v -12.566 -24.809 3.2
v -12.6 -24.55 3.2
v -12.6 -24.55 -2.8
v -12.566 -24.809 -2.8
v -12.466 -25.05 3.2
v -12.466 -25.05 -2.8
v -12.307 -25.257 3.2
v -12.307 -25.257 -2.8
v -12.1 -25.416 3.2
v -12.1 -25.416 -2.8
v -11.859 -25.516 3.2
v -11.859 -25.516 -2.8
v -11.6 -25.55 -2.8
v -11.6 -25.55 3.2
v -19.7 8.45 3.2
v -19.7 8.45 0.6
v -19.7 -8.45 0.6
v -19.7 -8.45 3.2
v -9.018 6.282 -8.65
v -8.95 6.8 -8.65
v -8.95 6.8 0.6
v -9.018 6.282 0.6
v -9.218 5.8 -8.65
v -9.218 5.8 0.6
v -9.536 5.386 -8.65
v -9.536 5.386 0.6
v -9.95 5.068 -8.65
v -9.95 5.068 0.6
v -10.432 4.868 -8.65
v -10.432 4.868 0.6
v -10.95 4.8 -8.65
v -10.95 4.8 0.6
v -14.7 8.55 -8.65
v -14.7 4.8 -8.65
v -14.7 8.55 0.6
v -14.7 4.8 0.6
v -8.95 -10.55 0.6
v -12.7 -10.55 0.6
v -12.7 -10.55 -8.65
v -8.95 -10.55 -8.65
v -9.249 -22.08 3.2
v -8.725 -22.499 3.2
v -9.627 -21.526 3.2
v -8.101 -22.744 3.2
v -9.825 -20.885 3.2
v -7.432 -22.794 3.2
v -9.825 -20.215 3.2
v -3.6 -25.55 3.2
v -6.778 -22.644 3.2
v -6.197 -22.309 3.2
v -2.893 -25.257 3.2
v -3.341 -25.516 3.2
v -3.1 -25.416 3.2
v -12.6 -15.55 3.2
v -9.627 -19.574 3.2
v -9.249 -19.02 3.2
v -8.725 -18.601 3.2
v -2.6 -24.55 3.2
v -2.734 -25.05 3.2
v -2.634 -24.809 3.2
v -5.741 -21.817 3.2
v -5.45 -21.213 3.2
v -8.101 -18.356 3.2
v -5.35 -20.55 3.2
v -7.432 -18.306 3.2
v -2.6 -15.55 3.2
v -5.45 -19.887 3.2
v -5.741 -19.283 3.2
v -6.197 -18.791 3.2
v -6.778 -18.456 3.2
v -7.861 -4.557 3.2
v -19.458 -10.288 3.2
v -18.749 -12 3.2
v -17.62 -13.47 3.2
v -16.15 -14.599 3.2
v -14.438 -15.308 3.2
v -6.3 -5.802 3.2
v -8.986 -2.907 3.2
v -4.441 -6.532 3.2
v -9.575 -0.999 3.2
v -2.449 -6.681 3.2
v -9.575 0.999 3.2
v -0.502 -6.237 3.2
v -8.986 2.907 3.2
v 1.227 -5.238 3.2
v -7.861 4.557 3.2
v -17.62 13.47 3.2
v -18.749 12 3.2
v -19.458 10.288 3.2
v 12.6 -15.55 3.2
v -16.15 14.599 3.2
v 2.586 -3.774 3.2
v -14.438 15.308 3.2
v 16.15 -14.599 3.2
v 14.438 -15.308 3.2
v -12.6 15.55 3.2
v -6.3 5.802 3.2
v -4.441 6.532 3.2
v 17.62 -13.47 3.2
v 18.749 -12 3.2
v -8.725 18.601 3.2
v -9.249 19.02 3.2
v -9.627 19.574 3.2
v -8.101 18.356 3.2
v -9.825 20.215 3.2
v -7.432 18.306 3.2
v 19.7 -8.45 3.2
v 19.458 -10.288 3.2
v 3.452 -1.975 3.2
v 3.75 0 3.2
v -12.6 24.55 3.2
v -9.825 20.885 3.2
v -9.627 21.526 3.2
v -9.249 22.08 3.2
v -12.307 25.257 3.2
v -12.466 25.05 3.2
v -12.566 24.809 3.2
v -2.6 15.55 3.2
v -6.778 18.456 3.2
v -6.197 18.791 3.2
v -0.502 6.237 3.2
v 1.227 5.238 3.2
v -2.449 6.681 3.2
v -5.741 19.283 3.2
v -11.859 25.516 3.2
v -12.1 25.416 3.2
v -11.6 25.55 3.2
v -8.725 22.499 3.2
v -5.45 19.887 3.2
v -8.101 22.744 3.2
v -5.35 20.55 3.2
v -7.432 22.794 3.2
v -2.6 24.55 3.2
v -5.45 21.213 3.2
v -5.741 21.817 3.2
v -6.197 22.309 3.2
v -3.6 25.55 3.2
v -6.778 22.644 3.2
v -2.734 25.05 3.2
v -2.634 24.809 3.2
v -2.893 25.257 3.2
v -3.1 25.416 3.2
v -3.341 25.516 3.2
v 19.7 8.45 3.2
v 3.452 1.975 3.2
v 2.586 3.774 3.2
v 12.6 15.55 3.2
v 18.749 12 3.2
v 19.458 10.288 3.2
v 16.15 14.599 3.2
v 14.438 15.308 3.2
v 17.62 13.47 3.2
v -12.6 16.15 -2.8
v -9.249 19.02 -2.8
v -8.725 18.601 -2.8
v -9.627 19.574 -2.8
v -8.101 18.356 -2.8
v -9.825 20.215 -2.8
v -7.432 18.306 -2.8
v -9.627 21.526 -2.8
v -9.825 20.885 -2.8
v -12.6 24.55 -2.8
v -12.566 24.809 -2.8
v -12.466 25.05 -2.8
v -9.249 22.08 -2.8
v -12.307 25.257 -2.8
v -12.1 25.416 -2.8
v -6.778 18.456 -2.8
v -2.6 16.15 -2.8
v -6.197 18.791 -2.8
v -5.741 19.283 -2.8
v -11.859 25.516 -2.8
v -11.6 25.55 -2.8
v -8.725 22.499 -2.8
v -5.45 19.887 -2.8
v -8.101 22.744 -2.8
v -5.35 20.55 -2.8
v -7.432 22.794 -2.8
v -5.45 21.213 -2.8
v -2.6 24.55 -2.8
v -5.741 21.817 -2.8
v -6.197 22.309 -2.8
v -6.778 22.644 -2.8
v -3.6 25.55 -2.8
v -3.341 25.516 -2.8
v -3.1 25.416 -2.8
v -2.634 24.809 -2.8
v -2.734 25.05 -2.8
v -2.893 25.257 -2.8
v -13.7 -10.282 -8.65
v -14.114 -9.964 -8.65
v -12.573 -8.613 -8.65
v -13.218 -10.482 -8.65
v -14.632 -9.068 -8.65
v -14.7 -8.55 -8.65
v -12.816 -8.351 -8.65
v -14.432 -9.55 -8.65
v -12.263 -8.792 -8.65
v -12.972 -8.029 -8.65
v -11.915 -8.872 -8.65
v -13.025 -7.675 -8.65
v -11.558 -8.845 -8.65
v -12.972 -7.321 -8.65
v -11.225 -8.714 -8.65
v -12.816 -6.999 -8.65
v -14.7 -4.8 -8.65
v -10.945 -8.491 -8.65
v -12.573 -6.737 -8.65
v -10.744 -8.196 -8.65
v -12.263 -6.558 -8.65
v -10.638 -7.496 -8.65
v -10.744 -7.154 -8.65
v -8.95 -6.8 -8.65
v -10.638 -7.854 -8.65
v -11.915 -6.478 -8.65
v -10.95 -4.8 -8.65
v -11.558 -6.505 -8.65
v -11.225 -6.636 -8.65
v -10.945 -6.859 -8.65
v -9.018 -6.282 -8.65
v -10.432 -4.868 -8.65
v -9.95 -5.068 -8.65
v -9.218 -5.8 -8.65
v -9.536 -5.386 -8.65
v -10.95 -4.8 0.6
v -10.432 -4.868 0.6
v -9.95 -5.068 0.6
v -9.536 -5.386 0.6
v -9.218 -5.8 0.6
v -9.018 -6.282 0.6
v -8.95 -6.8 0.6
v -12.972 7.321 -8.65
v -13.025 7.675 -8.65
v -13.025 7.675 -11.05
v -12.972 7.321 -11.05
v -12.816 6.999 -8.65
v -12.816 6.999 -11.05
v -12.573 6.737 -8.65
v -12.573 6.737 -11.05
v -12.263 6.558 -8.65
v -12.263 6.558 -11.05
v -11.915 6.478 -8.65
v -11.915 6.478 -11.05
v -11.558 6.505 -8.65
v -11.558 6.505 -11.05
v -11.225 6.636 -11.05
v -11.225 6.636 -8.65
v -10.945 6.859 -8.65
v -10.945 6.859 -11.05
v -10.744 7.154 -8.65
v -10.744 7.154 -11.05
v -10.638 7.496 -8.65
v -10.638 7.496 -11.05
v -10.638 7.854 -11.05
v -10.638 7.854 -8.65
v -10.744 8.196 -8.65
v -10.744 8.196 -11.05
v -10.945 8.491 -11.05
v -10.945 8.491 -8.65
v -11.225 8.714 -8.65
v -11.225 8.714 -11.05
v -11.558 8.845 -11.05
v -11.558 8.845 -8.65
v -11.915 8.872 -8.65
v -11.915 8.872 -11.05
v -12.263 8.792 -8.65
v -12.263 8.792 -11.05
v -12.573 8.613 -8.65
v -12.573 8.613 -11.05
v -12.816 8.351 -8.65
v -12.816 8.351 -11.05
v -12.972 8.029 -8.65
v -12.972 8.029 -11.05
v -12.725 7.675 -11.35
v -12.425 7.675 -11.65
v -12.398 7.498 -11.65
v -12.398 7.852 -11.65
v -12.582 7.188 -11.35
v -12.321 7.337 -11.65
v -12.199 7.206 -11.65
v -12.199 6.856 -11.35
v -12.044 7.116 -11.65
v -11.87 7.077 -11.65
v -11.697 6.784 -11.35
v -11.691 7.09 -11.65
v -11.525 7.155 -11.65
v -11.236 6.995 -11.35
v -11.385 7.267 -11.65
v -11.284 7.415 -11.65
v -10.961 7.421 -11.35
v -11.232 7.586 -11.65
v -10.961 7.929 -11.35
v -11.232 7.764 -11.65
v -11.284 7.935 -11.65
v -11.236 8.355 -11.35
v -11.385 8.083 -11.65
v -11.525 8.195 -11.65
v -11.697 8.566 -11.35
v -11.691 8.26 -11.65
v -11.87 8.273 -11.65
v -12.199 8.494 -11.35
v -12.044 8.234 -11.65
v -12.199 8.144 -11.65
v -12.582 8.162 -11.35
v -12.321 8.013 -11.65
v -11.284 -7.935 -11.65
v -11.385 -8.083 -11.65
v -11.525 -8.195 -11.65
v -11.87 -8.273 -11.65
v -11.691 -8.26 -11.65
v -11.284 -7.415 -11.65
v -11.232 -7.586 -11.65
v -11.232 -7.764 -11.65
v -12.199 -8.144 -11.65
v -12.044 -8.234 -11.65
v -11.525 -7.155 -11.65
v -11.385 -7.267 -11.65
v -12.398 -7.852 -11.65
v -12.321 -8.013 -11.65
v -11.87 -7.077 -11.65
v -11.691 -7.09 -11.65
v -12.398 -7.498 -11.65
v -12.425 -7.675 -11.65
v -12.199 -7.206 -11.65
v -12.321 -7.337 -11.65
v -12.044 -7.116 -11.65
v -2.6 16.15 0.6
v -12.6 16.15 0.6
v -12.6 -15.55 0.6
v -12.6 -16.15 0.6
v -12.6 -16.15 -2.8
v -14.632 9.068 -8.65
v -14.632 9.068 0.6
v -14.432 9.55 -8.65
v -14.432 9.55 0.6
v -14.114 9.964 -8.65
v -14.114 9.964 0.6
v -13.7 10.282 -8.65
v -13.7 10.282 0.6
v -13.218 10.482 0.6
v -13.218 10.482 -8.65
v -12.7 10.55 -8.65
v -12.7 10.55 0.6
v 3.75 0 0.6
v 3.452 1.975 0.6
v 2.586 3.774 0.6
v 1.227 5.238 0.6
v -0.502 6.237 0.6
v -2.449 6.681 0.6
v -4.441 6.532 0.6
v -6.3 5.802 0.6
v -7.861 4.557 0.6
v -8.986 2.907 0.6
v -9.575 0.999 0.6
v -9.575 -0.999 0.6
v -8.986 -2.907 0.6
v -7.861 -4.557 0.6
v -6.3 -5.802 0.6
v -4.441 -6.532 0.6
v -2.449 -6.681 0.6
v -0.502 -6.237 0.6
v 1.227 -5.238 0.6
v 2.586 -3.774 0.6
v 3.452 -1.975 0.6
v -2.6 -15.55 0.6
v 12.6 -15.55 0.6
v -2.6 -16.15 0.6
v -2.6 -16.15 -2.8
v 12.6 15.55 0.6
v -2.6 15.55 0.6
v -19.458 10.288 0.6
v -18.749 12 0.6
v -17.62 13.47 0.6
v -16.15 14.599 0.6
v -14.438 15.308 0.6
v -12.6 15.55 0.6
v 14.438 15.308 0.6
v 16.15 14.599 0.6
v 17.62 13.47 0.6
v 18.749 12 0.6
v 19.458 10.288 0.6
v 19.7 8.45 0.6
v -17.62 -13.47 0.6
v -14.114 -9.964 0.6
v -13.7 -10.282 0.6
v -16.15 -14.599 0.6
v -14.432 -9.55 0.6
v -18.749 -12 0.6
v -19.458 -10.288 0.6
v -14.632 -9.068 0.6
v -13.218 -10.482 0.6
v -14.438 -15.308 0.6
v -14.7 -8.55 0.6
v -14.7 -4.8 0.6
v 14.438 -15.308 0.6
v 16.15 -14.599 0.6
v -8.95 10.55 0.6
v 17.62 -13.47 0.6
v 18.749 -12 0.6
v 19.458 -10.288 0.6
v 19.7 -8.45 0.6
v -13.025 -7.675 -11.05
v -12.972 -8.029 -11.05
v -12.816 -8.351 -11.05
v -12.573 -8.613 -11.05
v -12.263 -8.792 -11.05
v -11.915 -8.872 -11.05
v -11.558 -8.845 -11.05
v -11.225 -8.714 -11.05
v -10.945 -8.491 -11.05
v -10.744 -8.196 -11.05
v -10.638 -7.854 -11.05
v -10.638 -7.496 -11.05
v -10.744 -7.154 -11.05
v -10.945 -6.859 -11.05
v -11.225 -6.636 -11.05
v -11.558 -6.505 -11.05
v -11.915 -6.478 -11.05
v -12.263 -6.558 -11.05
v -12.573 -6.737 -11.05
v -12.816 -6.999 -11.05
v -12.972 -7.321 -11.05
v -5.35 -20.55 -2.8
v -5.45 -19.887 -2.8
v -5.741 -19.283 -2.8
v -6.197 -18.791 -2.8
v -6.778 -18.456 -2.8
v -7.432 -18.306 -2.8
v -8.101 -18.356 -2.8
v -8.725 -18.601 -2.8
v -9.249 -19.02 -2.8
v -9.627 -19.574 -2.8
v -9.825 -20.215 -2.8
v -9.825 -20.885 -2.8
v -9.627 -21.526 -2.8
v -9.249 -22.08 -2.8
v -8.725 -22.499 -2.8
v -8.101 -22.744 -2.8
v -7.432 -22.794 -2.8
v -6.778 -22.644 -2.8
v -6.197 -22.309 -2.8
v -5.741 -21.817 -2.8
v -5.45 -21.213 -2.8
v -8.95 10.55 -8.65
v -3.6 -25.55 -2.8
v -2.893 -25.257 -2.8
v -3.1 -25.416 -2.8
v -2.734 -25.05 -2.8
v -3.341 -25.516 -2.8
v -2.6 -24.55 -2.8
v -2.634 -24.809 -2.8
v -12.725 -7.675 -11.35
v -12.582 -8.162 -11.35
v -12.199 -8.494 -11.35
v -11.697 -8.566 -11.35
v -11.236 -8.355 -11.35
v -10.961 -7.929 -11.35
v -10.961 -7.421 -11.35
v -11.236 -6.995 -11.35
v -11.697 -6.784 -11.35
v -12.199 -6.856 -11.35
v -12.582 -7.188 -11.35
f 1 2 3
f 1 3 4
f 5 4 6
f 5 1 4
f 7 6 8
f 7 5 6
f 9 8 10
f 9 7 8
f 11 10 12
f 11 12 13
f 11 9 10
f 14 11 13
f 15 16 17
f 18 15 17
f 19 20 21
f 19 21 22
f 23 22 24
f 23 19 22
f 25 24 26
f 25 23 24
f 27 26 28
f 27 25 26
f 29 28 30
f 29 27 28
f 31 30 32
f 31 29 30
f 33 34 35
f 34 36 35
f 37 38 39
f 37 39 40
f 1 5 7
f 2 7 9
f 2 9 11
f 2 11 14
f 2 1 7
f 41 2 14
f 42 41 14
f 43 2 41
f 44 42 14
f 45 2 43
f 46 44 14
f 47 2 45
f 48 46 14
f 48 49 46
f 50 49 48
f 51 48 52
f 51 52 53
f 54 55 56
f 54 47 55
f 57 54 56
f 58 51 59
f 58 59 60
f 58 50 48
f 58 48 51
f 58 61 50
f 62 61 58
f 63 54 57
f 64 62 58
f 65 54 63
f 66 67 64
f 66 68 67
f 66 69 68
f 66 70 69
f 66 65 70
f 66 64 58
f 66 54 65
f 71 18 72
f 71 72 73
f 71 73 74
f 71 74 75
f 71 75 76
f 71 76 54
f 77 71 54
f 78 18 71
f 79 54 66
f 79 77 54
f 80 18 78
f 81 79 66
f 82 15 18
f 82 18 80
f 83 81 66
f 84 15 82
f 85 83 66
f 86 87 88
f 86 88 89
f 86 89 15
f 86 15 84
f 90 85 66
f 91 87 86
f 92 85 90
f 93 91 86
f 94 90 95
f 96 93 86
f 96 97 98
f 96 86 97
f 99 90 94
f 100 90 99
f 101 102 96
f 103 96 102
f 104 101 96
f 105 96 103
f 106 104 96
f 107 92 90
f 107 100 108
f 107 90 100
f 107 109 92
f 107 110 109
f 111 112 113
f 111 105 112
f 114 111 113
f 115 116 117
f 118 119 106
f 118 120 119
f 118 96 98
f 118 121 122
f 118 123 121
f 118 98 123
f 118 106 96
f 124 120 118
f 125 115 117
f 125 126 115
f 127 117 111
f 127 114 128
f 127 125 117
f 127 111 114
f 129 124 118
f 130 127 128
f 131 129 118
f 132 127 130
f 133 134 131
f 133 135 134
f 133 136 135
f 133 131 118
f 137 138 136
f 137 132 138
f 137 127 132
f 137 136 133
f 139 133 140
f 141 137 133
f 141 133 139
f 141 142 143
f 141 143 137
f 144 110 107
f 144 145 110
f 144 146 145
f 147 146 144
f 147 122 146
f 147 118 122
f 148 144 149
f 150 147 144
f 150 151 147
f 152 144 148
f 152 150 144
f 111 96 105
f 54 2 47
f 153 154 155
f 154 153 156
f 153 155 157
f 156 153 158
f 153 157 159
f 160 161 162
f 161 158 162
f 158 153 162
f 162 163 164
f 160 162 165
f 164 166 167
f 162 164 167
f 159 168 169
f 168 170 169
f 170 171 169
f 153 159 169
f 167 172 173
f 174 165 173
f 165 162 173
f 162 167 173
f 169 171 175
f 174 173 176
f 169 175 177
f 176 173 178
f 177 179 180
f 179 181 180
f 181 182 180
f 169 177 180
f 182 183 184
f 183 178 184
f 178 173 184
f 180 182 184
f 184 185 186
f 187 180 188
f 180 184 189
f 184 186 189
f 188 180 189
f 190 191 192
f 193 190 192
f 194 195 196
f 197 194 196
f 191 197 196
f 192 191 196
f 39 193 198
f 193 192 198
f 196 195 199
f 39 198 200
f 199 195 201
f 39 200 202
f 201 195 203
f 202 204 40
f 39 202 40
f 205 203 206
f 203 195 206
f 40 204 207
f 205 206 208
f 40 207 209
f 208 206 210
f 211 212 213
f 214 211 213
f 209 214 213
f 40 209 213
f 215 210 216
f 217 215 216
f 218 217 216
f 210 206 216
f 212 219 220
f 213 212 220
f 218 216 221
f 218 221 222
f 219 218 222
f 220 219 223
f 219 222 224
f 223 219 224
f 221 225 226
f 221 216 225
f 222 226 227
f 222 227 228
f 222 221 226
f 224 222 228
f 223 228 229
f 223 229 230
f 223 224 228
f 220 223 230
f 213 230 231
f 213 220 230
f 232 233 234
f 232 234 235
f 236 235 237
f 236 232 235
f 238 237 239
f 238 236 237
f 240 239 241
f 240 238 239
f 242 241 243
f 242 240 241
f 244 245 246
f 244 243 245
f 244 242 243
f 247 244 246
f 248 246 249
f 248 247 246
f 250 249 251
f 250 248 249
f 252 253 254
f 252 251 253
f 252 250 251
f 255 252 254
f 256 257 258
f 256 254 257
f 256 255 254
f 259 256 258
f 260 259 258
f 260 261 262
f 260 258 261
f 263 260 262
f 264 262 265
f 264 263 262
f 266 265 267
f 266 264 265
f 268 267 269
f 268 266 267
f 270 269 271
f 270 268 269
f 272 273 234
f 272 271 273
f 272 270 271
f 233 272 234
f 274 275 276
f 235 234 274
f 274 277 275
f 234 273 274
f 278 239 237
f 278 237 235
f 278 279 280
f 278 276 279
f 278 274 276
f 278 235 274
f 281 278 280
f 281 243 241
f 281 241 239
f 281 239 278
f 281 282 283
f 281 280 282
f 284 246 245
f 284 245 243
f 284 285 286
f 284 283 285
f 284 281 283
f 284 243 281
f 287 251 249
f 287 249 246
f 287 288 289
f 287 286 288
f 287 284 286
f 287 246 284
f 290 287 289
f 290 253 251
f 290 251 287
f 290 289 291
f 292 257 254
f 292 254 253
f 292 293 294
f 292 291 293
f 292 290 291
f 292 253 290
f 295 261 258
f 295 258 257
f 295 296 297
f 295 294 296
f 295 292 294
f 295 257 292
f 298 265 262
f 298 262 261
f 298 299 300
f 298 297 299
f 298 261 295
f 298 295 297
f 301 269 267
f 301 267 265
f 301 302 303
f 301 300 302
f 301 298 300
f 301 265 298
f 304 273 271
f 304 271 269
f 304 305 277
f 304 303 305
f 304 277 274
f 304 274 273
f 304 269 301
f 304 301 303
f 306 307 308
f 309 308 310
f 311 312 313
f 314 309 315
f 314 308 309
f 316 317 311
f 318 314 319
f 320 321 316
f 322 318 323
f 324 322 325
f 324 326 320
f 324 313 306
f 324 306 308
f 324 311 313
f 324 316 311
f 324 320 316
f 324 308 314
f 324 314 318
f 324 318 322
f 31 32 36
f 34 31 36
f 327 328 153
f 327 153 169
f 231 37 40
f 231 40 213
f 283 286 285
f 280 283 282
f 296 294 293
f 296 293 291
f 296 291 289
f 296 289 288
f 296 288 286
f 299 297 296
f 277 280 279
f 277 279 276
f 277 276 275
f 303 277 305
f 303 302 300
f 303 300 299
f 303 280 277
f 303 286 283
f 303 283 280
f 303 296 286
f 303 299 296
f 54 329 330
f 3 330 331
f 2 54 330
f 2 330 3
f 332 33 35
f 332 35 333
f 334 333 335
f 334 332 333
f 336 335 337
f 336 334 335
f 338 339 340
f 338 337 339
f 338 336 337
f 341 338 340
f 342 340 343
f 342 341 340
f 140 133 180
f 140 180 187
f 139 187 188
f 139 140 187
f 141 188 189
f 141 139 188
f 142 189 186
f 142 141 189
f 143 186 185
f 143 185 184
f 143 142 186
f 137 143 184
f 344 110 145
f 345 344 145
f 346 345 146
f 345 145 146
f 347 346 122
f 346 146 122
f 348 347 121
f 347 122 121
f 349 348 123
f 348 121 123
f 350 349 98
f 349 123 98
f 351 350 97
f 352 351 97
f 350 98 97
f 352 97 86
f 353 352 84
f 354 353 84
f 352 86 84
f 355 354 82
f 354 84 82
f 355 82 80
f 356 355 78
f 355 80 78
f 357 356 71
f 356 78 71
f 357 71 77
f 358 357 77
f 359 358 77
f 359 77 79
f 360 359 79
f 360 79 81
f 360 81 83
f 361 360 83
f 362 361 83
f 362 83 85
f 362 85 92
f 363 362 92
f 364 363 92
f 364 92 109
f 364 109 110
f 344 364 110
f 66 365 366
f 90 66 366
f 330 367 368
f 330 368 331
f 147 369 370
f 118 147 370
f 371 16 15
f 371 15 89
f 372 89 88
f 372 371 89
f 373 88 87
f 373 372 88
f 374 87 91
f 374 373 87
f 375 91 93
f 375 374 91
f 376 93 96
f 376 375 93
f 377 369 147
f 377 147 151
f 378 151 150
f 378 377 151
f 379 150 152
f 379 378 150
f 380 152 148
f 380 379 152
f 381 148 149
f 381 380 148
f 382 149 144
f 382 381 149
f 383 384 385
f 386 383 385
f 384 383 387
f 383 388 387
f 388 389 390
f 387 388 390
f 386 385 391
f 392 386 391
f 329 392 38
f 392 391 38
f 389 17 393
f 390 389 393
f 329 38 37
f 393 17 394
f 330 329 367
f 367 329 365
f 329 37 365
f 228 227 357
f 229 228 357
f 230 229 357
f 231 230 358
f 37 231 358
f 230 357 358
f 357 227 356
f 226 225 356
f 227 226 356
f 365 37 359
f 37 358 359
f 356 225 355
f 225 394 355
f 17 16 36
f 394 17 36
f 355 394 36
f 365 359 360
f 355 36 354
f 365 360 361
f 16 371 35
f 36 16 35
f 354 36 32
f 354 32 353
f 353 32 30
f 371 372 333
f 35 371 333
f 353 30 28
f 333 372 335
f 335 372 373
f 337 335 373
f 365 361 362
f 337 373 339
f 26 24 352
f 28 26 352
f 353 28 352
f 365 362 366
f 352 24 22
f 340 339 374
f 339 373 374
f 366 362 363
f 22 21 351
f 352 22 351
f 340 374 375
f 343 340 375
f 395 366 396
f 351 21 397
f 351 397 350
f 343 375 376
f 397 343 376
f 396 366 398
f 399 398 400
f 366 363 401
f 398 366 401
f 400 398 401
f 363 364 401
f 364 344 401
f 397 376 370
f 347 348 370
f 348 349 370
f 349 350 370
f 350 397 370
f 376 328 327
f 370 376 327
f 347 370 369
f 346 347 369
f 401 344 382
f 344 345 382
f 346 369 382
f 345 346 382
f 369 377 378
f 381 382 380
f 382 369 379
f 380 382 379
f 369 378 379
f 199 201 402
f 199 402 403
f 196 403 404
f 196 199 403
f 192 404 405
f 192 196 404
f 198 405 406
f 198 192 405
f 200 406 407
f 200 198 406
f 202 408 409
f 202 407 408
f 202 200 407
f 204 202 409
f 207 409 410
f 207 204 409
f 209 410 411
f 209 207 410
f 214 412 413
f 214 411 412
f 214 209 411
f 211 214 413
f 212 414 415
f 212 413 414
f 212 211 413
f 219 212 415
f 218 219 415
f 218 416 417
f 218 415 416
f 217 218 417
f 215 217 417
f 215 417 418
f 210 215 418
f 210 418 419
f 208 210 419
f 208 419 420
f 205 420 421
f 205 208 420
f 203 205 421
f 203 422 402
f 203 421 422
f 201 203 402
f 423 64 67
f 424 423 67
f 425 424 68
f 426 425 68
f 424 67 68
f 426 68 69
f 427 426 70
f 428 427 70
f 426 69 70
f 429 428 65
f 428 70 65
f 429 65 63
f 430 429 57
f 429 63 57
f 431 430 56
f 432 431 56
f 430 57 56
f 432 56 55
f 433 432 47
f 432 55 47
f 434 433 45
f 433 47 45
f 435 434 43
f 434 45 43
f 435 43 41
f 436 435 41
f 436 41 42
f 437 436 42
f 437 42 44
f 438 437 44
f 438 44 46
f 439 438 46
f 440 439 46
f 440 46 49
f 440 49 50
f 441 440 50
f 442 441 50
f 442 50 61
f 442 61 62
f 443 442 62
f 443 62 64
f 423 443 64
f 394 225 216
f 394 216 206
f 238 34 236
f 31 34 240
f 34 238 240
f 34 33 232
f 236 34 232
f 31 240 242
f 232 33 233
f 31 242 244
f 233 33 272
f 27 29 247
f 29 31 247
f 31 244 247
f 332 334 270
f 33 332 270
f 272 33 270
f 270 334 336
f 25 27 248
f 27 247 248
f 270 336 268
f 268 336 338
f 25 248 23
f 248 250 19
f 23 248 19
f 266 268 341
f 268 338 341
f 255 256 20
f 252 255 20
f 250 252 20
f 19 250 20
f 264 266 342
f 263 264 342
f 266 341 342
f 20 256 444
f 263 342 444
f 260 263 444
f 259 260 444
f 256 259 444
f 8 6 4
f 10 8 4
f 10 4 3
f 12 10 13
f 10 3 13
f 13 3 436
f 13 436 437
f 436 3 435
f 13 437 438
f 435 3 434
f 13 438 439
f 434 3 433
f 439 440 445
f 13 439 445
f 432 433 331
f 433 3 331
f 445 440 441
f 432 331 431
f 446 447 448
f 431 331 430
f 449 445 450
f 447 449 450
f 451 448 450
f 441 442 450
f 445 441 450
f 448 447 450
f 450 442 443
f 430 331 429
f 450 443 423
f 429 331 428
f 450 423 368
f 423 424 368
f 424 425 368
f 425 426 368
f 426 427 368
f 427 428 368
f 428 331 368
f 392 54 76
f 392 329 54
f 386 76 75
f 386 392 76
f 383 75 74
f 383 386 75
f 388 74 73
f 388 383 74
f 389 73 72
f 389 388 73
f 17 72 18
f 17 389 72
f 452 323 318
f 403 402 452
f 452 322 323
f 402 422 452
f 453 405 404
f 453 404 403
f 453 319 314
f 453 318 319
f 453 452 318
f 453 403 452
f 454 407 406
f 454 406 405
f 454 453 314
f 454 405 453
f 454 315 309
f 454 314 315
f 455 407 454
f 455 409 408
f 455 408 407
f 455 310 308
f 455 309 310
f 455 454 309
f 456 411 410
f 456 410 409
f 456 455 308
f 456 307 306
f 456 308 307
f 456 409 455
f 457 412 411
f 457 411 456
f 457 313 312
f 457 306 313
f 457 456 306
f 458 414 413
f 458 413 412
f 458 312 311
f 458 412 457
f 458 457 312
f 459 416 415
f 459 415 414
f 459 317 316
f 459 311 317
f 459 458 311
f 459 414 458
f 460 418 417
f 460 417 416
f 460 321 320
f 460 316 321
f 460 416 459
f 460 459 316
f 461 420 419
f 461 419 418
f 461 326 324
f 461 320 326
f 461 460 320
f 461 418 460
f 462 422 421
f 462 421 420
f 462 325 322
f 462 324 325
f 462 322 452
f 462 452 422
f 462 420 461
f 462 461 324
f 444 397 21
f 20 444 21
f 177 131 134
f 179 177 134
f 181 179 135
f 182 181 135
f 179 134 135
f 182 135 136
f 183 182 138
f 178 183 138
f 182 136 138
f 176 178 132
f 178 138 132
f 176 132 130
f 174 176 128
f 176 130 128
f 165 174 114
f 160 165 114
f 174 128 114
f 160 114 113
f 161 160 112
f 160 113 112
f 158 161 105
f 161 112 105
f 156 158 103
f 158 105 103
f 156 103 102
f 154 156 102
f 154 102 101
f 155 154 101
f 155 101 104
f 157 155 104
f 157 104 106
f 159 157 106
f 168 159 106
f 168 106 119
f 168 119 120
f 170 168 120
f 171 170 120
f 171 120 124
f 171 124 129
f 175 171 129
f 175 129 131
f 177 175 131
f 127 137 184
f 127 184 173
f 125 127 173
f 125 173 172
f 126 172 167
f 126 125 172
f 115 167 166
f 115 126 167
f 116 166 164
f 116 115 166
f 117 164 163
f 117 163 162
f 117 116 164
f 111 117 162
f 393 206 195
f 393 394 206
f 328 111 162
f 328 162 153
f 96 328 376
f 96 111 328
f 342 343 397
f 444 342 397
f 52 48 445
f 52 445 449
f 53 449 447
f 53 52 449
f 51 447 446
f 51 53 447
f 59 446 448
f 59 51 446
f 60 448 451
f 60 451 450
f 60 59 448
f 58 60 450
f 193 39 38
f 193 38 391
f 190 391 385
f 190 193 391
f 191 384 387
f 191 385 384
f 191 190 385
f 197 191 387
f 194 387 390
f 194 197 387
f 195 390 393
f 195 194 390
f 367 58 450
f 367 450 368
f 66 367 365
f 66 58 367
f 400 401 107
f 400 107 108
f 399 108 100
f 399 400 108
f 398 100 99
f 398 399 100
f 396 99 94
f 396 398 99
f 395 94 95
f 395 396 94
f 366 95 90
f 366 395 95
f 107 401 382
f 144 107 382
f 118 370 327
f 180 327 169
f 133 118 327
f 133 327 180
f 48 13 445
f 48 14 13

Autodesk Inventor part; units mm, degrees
ref_plane "YZ Plane" through (0, 0, 0) normal (1, 0, 0) x (0, 1, 0)
ref_plane "Work Plane1" through (0, 0, 0.6) normal (0, 0, 1) x (1, 0, 0)
sketch "Sketch1" plane through (0, 0, 0.6) normal (0, 0, 1) x (1, 0, 0)
  circle A0 centre (-11.825, -7.675) radius 1.2 projected
  circle A1 centre (-11.825, 7.675) radius 1.2 projected
  line L0 (-14.7, 10.55) -> (-8.95, 10.55)
  line L1 (-8.95, 10.55) -> (-8.95, 4.8)
  line L2 (-8.95, 4.8) -> (-14.7, 4.8)
  line L3 (-14.7, 4.8) -> (-14.7, 10.55)
  line L4 (-14.7, 10.55) -> (-8.95, 4.8) construction
  line L5 (-8.95, 10.55) -> (-14.7, 4.8) construction
  line L6 (-14.7, -10.55) -> (-8.95, -10.55)
  line L7 (-8.95, -10.55) -> (-8.95, -4.8)
  line L8 (-8.95, -4.8) -> (-14.7, -4.8)
  line L9 (-14.7, -4.8) -> (-14.7, -10.55)
  line L10 (-14.7, -10.55) -> (-8.95, -4.8) construction
  line L11 (-8.95, -10.55) -> (-14.7, -4.8) construction
  arc A2 (-19.7, -8.45) -> (-12.6, -15.55) centre (-12.6, -8.45) ccw projected
  line L12 (-12.6, -15.55) -> (12.6, -15.55) projected
  arc A3 (12.6, -15.55) -> (19.7, -8.45) centre (12.6, -8.45) ccw projected
  line L13 (19.7, -8.45) -> (19.7, -7) projected
  line L14 (19.7, -7) -> (15.7, -7) projected
  line L15 (15.7, -7) -> (15.7, -8.45) projected
  arc A4 (12.6, -11.55) -> (15.7, -8.45) centre (12.6, -8.45) ccw projected
  line L16 (12.6, -11.55) -> (-12.6, -11.55) projected
  arc A5 (-15.7, -8.45) -> (-12.6, -11.55) centre (-12.6, -8.45) ccw projected
  line L17 (-15.7, -8.45) -> (-15.7, 8.45) projected
  arc A6 (-12.6, 11.55) -> (-15.7, 8.45) centre (-12.6, 8.45) ccw projected
  line L18 (-12.6, 11.55) -> (12.6, 11.55) projected
  arc A7 (15.7, 8.45) -> (12.6, 11.55) centre (12.6, 8.45) ccw projected
  line L19 (15.7, 8.45) -> (15.7, 7) projected
  line L20 (15.7, 7) -> (19.7, 7) projected
  line L21 (19.7, 7) -> (19.7, 8.45) projected
  arc A8 (19.7, 8.45) -> (12.6, 15.55) centre (12.6, 8.45) ccw projected
  line L22 (12.6, 15.55) -> (-12.6, 15.55) projected
  arc A9 (-12.6, 15.55) -> (-19.7, 8.45) centre (-12.6, 8.45) ccw projected
  line L23 (-19.7, 8.45) -> (-19.7, -8.45) projected
  point P0 (0, 0)
  dimension "d1" = 1
  dimension "d2" = 1
ref_plane "Work Plane2" through (-15.1, -10.95, -8.65) normal (0, 0, 1) x (1, 0, 0)
extrude "Extrusion1" add sketch "Sketch1" against normal up to surface (9.25 mm away) contours A0 | A1 | L0 L1 L2 L3 | L9 L8 L7 L6
fillet "Fillet1" radius 2 4 edges at (-14.7, 10.55, -4.025) (-14.7, -10.55, -4.025) (-8.95, 4.8, -4.025) (-8.95, -4.8, -4.025)
sketch "Sketch2" plane through (-10.95, 4.8, -8.65) normal (0, 0, -1) x (-1, 0, 0)
  circle A0 centre (0.875, 2.875) radius 1.2 projected
  circle A1 centre (0.875, -12.475) radius 1.2 projected
  point P0 (-10.95, -4.8)
extrude "Extrusion2" add sketch "Sketch2" along normal blind 3
chamfer "Chamfer1" distance 0.6 angle 45 2 edges at (-10.625, 7.675, -11.65) (-10.625, -7.675, -11.65)
sketch "Sketch3" plane through (0, 0, 0.6) normal (0, 0, 1) x (1, 0, 0)
  arc A0 (-19.7, -8.45) -> (-12.6, -15.55) centre (-12.6, -8.45) ccw projected
  line L0 (-12.6, -15.55) -> (12.6, -15.55) projected
  arc A1 (12.6, -15.55) -> (19.7, -8.45) centre (12.6, -8.45) ccw projected
  line L1 (19.7, -8.45) -> (19.7, -7) projected
  line L2 (19.7, -7) -> (15.7, -7) projected
  line L3 (15.7, -7) -> (15.7, -8.45) projected
  arc A2 (12.6, -11.55) -> (15.7, -8.45) centre (12.6, -8.45) ccw projected
  line L4 (12.6, -11.55) -> (-12.6, -11.55) projected
  arc A3 (-15.7, -8.45) -> (-12.6, -11.55) centre (-12.6, -8.45) ccw projected
  line L5 (-15.7, -8.45) -> (-15.7, 8.45) projected
  arc A4 (-12.6, 11.55) -> (-15.7, 8.45) centre (-12.6, 8.45) ccw projected
  line L6 (-12.6, 11.55) -> (12.6, 11.55) projected
  arc A5 (15.7, 8.45) -> (12.6, 11.55) centre (12.6, 8.45) ccw projected
  line L7 (15.7, 8.45) -> (15.7, 7) projected
  line L8 (15.7, 7) -> (19.7, 7) projected
  line L9 (19.7, 7) -> (19.7, 8.45) projected
  arc A6 (19.7, 8.45) -> (12.6, 15.55) centre (12.6, 8.45) ccw projected
  line L10 (12.6, 15.55) -> (-12.6, 15.55) projected
  arc A7 (-12.6, 15.55) -> (-19.7, 8.45) centre (-12.6, 8.45) ccw projected
  line L11 (-19.7, 8.45) -> (-19.7, -8.45) projected
  circle A8 centre (-11.825, 7.675) radius 1.2 projected
  circle A9 centre (-11.825, -7.675) radius 1.2 projected
  line L12 (19.7, 7) -> (15.7, 7) projected
  line L13 (15.7, 7) -> (15.7, 8.45) projected
  arc A10 (15.7, 8.45) -> (12.6, 11.55) centre (12.6, 8.45) ccw projected
  line L14 (12.6, 11.55) -> (-12.6, 11.55) projected
  arc A11 (-12.6, 11.55) -> (-15.7, 8.45) centre (-12.6, 8.45) ccw projected
  line L15 (-15.7, 8.45) -> (-15.7, -8.45) projected
  arc A12 (-15.7, -8.45) -> (-12.6, -11.55) centre (-12.6, -8.45) ccw projected
  line L16 (-12.6, -11.55) -> (12.6, -11.55) projected
  arc A13 (12.6, -11.55) -> (15.7, -8.45) centre (12.6, -8.45) ccw projected
  line L17 (15.7, -8.45) -> (15.7, -7) projected
  line L18 (15.7, -7) -> (19.7, -7) projected
  line L19 (19.7, 7) -> (19.7, -7) projected
  line L20 (15.7, -7) -> (15.7, 7)
  point P0 (0, 0)
extrude "Extrusion3" add sketch "Sketch3" along normal blind 2.6 contours L11 A7 L10 A6 L9 L8 L7 A5 L6 A4 L5 A3 L4 A2 L3 L2 L1 A1 L0 A0 | L2 L20 L8 L19 | L3 A2 L4 A3 L5 A4 L6 A5 L7 L20 | A8 | A9
sketch "Sketch4" plane through (0, 0, 3.2) normal (0, 0, 1) x (1, 0, 0)
  circle A0 centre (-2.95, 0) radius 5.7 projected
  circle A1 centre (-2.95, 0) radius 6.7
  point P0 (0, 0)
  dimension "d13" = 1
extrude "Extrusion4" cut sketch "Sketch4" against normal through all contours A0 | A1
sketch "Sketch5" plane through (0, 0, 3.2) normal (0, 0, 1) x (1, 0, 0)
  circle A0 centre (-2.95, 0) radius 6.7 projected
  line L0 (19.7, -8.45) -> (19.7, 8.45) projected
  arc A1 (19.7, 8.45) -> (12.6, 15.55) centre (12.6, 8.45) ccw projected
  line L1 (12.6, 15.55) -> (-12.6, 15.55) projected
  arc A2 (-12.6, 15.55) -> (-19.7, 8.45) centre (-12.6, 8.45) ccw projected
  line L2 (-19.7, 8.45) -> (-19.7, -8.45) projected
  arc A3 (-19.7, -8.45) -> (-12.6, -15.55) centre (-12.6, -8.45) ccw projected
  line L3 (-12.6, -15.55) -> (12.6, -15.55) projected
  arc A4 (12.6, -15.55) -> (19.7, -8.45) centre (12.6, -8.45) ccw projected
  arc A5 (-12.6, -24.55) -> (-11.6, -25.55) centre (-11.6, -24.55) ccw projected
  line L4 (-11.6, -25.55) -> (-3.6, -25.55) projected
  arc A6 (-3.6, -25.55) -> (-2.6, -24.55) centre (-3.6, -24.55) ccw projected
  line L5 (-2.6, -24.55) -> (-2.6, -16.55) projected
  arc A7 (-1.6, -15.55) -> (-2.6, -16.55) centre (-1.6, -16.55) ccw projected
  line L6 (-1.6, -15.55) -> (-12.6, -15.55) projected
  arc A8 (-13.4765, -15.4957) -> (-12.6, -15.55) centre (-12.6, -8.45) ccw projected
  arc A9 (-12.6, -16.488) -> (-13.4765, -15.4957) centre (-13.6, -16.488) ccw projected
  line L7 (-12.6, -16.488) -> (-12.6, -24.55) projected
  circle A10 centre (-7.6, -20.55) radius 2.25 projected
  arc A11 (-2.6, 24.55) -> (-3.6, 25.55) centre (-3.6, 24.55) ccw projected
  line L8 (-3.6, 25.55) -> (-11.6, 25.55) projected
  arc A12 (-11.6, 25.55) -> (-12.6, 24.55) centre (-11.6, 24.55) ccw projected
  line L9 (-12.6, 24.55) -> (-12.6, 16.488) projected
  arc A13 (-13.4765, 15.4957) -> (-12.6, 16.488) centre (-13.6, 16.488) ccw projected
  arc A14 (-12.6, 15.55) -> (-13.4765, 15.4957) centre (-12.6, 8.45) ccw projected
  line L10 (-1.6, 15.55) -> (-12.6, 15.55) projected
  arc A15 (-2.6, 16.55) -> (-1.6, 15.55) centre (-1.6, 16.55) ccw projected
  line L11 (-2.6, 16.55) -> (-2.6, 24.55) projected
  circle A16 centre (-7.6, 20.55) radius 2.25 projected
  line L12 (-12.6, -16.488) -> (-12.6, -15.55)
  line L13 (-2.6, -16.55) -> (-2.6, -15.55)
  line L14 (-12.6, 16.488) -> (-12.6, 15.55)
  line L15 (-2.6, 16.55) -> (-2.6, 15.55)
  point P0 (0, 0)
extrude "Extrusion5" add sketch "Sketch5" against normal blind 6 contours L13 L5 A6 L4 A5 L7 L12 L3 | L1 L14 L9 A12 L8 A11 L11 L15
sketch "Sketch6" plane through (-12.6, 15.55, 0.6) normal (0, -1, 0) x (1, 0, 0)
  line L0 (10, 0) -> (0, 0) projected
  line L1 (0, 0) -> (0, -3.4) projected
  line L2 (10, -3.4) -> (0, -3.4) projected
  line L3 (10, 0) -> (10, -3.4) projected
  point P0 (12.6, -0.6)
extrude "Extrusion6" cut sketch "Sketch6" against normal blind 0.6
mirror "Mirror1" about plane through (0, 0, 0) normal (0, 1, 0) of "Extrusion6"
equation "\"d2\" = d1"
properties part number "PrzyciskSTOP_2_3DPrint"
